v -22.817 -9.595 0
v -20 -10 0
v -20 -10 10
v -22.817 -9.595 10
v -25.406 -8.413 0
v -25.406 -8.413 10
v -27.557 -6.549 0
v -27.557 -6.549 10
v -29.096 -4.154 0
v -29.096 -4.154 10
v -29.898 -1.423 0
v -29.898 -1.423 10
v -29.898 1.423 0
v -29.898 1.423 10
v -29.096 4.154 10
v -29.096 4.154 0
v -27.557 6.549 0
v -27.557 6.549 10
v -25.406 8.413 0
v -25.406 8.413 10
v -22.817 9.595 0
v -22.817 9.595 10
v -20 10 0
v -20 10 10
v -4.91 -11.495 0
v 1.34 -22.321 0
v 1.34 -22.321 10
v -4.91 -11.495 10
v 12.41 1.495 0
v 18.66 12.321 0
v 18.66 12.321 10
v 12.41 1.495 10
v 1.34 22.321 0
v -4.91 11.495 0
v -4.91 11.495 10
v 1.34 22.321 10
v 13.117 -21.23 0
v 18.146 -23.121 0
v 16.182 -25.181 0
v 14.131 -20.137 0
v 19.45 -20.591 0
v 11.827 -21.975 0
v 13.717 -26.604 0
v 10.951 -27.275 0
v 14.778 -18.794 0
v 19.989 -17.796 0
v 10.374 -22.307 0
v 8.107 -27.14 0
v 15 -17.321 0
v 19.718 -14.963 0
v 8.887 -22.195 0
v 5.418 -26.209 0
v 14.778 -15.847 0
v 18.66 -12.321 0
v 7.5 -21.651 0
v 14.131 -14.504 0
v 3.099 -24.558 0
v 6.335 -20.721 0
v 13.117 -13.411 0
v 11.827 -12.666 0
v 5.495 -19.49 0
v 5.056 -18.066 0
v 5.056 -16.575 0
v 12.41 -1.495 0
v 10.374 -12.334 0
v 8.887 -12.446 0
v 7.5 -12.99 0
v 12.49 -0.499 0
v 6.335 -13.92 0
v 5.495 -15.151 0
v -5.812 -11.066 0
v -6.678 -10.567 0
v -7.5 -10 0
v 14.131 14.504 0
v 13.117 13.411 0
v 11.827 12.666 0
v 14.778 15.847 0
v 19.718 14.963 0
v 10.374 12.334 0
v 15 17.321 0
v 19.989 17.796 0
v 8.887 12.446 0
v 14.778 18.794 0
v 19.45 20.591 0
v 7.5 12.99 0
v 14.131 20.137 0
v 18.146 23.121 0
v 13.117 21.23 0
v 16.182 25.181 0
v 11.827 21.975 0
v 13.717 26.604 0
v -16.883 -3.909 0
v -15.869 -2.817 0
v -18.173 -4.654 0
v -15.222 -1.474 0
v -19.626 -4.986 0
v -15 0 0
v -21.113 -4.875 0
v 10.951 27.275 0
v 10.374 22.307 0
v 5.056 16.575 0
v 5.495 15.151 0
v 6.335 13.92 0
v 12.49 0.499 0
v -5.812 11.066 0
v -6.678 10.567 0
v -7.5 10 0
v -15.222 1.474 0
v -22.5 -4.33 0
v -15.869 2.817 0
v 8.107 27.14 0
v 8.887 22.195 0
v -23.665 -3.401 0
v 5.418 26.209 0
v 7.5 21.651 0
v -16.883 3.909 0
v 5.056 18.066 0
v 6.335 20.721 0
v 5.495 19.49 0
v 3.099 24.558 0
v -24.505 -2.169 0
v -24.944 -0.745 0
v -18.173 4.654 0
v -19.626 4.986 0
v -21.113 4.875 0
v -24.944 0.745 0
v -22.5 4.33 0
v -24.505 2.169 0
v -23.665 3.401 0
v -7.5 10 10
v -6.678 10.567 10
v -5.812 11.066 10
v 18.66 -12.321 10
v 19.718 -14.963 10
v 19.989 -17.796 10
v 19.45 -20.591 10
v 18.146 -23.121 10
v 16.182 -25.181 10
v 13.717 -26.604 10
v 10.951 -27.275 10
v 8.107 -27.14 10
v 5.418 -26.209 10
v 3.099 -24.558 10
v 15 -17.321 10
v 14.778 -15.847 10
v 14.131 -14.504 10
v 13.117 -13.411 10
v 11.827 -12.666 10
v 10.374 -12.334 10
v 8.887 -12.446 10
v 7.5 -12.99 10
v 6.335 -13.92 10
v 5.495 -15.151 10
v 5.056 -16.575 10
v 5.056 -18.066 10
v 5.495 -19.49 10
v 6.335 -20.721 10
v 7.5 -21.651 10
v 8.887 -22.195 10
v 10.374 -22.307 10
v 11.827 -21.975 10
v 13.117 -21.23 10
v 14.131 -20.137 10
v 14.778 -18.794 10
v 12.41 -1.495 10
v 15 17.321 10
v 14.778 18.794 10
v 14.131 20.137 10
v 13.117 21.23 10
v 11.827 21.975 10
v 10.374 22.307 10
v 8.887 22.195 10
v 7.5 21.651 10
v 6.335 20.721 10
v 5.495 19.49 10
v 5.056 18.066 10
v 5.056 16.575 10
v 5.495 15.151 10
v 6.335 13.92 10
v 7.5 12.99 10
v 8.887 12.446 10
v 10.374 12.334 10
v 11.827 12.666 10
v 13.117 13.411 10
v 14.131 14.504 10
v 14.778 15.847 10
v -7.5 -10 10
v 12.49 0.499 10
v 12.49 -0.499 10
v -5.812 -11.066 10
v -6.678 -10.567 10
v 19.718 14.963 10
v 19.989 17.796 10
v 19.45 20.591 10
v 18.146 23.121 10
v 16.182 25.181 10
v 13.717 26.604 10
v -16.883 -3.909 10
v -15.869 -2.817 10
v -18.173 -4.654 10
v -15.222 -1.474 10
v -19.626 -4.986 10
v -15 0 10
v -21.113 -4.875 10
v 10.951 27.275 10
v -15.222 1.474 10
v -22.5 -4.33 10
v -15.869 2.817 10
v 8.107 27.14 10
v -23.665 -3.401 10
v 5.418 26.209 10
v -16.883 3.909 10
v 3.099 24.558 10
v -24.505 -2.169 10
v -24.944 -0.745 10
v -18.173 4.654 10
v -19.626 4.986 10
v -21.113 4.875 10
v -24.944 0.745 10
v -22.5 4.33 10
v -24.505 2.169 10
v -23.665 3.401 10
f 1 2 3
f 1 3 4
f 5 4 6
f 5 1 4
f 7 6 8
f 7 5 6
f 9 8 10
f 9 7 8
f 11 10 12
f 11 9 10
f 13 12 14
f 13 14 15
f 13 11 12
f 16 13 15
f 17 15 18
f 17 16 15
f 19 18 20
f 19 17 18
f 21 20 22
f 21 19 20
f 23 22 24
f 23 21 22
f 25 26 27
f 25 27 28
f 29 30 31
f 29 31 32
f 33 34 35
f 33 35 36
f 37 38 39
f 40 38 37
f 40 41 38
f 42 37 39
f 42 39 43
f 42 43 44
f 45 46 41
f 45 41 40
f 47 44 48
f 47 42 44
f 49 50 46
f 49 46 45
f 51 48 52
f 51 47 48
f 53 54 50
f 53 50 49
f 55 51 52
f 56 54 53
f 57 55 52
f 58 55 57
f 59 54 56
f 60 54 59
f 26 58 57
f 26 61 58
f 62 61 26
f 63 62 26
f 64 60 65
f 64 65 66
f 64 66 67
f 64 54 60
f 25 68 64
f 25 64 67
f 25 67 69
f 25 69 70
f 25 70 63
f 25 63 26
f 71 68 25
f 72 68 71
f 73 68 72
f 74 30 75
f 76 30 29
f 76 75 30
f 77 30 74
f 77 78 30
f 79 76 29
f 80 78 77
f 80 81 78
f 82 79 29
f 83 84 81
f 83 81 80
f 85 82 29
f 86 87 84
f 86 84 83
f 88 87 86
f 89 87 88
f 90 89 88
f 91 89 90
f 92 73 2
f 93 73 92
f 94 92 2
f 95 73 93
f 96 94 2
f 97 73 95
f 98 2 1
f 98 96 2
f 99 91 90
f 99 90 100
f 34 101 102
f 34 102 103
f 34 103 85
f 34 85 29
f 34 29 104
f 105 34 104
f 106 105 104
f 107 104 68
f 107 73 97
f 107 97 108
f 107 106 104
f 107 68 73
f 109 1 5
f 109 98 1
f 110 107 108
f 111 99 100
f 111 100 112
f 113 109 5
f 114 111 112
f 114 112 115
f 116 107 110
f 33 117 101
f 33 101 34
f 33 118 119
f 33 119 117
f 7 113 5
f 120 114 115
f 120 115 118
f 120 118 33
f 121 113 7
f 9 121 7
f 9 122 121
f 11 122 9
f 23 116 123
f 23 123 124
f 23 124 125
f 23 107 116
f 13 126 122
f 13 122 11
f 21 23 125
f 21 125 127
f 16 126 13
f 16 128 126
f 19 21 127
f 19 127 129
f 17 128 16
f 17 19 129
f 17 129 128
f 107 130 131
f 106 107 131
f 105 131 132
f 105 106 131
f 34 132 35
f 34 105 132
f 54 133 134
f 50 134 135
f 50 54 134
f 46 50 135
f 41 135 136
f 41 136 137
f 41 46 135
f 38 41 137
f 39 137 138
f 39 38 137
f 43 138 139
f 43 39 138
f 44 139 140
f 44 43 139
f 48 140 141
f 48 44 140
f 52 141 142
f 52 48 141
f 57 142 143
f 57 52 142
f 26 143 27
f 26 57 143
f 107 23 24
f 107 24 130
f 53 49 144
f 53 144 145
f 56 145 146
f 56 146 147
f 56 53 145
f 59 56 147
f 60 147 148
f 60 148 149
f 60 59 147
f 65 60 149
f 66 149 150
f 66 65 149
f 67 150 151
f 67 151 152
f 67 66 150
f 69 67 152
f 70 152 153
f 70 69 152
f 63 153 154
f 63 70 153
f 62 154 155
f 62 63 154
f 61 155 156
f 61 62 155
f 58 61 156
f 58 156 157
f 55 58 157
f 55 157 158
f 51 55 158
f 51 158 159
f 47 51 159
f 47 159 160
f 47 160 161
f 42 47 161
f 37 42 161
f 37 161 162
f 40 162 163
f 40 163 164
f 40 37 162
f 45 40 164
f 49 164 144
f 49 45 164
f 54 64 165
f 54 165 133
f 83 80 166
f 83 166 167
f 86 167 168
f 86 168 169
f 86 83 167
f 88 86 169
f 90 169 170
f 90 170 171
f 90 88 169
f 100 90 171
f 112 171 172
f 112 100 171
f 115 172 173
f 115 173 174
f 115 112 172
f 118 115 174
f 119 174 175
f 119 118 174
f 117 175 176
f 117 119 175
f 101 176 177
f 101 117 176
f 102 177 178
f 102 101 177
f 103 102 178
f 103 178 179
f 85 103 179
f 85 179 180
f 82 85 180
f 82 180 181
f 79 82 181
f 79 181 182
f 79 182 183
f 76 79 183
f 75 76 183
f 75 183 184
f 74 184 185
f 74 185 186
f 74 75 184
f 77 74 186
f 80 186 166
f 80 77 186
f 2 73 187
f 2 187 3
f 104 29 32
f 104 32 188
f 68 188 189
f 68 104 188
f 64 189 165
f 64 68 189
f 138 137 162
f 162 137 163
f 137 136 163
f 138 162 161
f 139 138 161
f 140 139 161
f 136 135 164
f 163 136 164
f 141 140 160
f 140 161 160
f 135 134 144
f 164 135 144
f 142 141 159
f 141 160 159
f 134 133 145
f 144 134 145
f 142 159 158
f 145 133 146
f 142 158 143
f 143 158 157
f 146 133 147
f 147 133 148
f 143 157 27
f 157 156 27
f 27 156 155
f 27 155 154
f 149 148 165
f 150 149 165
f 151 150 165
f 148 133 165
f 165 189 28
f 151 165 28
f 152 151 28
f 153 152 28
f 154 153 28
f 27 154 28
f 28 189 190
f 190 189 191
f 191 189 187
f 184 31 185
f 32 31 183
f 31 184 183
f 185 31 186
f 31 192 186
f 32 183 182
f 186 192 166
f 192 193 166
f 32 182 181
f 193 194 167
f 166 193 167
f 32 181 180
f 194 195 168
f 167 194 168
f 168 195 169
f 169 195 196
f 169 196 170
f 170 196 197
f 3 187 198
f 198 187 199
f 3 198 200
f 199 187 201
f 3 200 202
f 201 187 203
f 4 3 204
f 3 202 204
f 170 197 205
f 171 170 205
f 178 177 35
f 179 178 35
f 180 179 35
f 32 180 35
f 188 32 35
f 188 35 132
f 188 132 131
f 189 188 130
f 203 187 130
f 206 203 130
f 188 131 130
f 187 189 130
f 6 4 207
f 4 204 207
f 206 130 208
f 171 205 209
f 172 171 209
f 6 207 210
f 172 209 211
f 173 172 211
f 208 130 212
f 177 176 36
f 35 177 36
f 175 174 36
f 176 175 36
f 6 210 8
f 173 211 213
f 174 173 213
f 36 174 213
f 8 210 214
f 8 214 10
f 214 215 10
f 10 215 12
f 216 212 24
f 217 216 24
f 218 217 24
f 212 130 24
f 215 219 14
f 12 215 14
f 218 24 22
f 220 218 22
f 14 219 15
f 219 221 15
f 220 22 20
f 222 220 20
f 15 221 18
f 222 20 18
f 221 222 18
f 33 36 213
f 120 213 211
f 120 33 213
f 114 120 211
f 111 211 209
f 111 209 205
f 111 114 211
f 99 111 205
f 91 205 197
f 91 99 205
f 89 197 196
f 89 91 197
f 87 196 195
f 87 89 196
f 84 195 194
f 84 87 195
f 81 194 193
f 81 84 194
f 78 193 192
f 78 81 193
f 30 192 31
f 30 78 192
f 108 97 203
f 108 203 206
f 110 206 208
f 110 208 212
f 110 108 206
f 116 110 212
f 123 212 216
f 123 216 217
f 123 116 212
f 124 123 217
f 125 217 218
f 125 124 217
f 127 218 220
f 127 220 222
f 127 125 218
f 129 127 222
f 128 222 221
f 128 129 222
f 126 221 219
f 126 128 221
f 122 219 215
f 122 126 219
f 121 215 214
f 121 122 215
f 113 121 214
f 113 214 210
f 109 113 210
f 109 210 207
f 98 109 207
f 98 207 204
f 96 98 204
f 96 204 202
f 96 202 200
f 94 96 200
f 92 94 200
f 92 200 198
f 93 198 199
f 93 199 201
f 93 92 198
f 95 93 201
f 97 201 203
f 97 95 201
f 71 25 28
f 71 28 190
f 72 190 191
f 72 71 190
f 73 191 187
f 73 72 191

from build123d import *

# Parameters (mm, degrees)
CROQUIS1_R              = 5
SALIENTE_EXTRUIR1_DEPTH = 10


with BuildPart() as part:
    # Croquis1 → Saliente-Extruir1 (new body)
    with BuildSketch(Plane.XY):
        with BuildLine():
            Line((-20, 10), (-7.5, 10))
            ThreePointArc((-7.5, 10), (-6.25, 10.825317547), (-4.910254038, 11.495190528))
            Line((-4.910254038, 11.495190528), (1.339745962, 22.320508076))
            ThreePointArc((1.339745962, 22.320508076), (15, 25.980762114), (18.660254038, 12.320508076))
            Line((18.660254038, 12.320508076), (12.410254038, 1.495190528))
            ThreePointArc((12.410254038, 1.495190528), (12.499999989, 0), (12.410254038, -1.495190528))
            Line((12.410254038, -1.495190528), (18.660254038, -12.320508076))
            ThreePointArc((18.660254038, -12.320508076), (15, -25.980762114), (1.339745962, -22.320508076))
            Line((1.339745962, -22.320508076), (-4.910254038, -11.495190528))
            ThreePointArc((-4.910254038, -11.495190528), (-6.25, -10.825317547), (-7.5, -10))
            Line((-7.5, -10), (-20, -10))
            ThreePointArc((-20, -10), (-30, 0), (-20, 10))
        make_face()
        with Locations((-20, 0)):
            Circle(CROQUIS1_R, mode=Mode.SUBTRACT)
        with Locations((10, 17.320508076)):
            Circle(CROQUIS1_R, mode=Mode.SUBTRACT)
        with Locations((10, -17.320508076)):
            Circle(CROQUIS1_R, mode=Mode.SUBTRACT)
    extrude(amount=SALIENTE_EXTRUIR1_DEPTH)


solid = part.part
